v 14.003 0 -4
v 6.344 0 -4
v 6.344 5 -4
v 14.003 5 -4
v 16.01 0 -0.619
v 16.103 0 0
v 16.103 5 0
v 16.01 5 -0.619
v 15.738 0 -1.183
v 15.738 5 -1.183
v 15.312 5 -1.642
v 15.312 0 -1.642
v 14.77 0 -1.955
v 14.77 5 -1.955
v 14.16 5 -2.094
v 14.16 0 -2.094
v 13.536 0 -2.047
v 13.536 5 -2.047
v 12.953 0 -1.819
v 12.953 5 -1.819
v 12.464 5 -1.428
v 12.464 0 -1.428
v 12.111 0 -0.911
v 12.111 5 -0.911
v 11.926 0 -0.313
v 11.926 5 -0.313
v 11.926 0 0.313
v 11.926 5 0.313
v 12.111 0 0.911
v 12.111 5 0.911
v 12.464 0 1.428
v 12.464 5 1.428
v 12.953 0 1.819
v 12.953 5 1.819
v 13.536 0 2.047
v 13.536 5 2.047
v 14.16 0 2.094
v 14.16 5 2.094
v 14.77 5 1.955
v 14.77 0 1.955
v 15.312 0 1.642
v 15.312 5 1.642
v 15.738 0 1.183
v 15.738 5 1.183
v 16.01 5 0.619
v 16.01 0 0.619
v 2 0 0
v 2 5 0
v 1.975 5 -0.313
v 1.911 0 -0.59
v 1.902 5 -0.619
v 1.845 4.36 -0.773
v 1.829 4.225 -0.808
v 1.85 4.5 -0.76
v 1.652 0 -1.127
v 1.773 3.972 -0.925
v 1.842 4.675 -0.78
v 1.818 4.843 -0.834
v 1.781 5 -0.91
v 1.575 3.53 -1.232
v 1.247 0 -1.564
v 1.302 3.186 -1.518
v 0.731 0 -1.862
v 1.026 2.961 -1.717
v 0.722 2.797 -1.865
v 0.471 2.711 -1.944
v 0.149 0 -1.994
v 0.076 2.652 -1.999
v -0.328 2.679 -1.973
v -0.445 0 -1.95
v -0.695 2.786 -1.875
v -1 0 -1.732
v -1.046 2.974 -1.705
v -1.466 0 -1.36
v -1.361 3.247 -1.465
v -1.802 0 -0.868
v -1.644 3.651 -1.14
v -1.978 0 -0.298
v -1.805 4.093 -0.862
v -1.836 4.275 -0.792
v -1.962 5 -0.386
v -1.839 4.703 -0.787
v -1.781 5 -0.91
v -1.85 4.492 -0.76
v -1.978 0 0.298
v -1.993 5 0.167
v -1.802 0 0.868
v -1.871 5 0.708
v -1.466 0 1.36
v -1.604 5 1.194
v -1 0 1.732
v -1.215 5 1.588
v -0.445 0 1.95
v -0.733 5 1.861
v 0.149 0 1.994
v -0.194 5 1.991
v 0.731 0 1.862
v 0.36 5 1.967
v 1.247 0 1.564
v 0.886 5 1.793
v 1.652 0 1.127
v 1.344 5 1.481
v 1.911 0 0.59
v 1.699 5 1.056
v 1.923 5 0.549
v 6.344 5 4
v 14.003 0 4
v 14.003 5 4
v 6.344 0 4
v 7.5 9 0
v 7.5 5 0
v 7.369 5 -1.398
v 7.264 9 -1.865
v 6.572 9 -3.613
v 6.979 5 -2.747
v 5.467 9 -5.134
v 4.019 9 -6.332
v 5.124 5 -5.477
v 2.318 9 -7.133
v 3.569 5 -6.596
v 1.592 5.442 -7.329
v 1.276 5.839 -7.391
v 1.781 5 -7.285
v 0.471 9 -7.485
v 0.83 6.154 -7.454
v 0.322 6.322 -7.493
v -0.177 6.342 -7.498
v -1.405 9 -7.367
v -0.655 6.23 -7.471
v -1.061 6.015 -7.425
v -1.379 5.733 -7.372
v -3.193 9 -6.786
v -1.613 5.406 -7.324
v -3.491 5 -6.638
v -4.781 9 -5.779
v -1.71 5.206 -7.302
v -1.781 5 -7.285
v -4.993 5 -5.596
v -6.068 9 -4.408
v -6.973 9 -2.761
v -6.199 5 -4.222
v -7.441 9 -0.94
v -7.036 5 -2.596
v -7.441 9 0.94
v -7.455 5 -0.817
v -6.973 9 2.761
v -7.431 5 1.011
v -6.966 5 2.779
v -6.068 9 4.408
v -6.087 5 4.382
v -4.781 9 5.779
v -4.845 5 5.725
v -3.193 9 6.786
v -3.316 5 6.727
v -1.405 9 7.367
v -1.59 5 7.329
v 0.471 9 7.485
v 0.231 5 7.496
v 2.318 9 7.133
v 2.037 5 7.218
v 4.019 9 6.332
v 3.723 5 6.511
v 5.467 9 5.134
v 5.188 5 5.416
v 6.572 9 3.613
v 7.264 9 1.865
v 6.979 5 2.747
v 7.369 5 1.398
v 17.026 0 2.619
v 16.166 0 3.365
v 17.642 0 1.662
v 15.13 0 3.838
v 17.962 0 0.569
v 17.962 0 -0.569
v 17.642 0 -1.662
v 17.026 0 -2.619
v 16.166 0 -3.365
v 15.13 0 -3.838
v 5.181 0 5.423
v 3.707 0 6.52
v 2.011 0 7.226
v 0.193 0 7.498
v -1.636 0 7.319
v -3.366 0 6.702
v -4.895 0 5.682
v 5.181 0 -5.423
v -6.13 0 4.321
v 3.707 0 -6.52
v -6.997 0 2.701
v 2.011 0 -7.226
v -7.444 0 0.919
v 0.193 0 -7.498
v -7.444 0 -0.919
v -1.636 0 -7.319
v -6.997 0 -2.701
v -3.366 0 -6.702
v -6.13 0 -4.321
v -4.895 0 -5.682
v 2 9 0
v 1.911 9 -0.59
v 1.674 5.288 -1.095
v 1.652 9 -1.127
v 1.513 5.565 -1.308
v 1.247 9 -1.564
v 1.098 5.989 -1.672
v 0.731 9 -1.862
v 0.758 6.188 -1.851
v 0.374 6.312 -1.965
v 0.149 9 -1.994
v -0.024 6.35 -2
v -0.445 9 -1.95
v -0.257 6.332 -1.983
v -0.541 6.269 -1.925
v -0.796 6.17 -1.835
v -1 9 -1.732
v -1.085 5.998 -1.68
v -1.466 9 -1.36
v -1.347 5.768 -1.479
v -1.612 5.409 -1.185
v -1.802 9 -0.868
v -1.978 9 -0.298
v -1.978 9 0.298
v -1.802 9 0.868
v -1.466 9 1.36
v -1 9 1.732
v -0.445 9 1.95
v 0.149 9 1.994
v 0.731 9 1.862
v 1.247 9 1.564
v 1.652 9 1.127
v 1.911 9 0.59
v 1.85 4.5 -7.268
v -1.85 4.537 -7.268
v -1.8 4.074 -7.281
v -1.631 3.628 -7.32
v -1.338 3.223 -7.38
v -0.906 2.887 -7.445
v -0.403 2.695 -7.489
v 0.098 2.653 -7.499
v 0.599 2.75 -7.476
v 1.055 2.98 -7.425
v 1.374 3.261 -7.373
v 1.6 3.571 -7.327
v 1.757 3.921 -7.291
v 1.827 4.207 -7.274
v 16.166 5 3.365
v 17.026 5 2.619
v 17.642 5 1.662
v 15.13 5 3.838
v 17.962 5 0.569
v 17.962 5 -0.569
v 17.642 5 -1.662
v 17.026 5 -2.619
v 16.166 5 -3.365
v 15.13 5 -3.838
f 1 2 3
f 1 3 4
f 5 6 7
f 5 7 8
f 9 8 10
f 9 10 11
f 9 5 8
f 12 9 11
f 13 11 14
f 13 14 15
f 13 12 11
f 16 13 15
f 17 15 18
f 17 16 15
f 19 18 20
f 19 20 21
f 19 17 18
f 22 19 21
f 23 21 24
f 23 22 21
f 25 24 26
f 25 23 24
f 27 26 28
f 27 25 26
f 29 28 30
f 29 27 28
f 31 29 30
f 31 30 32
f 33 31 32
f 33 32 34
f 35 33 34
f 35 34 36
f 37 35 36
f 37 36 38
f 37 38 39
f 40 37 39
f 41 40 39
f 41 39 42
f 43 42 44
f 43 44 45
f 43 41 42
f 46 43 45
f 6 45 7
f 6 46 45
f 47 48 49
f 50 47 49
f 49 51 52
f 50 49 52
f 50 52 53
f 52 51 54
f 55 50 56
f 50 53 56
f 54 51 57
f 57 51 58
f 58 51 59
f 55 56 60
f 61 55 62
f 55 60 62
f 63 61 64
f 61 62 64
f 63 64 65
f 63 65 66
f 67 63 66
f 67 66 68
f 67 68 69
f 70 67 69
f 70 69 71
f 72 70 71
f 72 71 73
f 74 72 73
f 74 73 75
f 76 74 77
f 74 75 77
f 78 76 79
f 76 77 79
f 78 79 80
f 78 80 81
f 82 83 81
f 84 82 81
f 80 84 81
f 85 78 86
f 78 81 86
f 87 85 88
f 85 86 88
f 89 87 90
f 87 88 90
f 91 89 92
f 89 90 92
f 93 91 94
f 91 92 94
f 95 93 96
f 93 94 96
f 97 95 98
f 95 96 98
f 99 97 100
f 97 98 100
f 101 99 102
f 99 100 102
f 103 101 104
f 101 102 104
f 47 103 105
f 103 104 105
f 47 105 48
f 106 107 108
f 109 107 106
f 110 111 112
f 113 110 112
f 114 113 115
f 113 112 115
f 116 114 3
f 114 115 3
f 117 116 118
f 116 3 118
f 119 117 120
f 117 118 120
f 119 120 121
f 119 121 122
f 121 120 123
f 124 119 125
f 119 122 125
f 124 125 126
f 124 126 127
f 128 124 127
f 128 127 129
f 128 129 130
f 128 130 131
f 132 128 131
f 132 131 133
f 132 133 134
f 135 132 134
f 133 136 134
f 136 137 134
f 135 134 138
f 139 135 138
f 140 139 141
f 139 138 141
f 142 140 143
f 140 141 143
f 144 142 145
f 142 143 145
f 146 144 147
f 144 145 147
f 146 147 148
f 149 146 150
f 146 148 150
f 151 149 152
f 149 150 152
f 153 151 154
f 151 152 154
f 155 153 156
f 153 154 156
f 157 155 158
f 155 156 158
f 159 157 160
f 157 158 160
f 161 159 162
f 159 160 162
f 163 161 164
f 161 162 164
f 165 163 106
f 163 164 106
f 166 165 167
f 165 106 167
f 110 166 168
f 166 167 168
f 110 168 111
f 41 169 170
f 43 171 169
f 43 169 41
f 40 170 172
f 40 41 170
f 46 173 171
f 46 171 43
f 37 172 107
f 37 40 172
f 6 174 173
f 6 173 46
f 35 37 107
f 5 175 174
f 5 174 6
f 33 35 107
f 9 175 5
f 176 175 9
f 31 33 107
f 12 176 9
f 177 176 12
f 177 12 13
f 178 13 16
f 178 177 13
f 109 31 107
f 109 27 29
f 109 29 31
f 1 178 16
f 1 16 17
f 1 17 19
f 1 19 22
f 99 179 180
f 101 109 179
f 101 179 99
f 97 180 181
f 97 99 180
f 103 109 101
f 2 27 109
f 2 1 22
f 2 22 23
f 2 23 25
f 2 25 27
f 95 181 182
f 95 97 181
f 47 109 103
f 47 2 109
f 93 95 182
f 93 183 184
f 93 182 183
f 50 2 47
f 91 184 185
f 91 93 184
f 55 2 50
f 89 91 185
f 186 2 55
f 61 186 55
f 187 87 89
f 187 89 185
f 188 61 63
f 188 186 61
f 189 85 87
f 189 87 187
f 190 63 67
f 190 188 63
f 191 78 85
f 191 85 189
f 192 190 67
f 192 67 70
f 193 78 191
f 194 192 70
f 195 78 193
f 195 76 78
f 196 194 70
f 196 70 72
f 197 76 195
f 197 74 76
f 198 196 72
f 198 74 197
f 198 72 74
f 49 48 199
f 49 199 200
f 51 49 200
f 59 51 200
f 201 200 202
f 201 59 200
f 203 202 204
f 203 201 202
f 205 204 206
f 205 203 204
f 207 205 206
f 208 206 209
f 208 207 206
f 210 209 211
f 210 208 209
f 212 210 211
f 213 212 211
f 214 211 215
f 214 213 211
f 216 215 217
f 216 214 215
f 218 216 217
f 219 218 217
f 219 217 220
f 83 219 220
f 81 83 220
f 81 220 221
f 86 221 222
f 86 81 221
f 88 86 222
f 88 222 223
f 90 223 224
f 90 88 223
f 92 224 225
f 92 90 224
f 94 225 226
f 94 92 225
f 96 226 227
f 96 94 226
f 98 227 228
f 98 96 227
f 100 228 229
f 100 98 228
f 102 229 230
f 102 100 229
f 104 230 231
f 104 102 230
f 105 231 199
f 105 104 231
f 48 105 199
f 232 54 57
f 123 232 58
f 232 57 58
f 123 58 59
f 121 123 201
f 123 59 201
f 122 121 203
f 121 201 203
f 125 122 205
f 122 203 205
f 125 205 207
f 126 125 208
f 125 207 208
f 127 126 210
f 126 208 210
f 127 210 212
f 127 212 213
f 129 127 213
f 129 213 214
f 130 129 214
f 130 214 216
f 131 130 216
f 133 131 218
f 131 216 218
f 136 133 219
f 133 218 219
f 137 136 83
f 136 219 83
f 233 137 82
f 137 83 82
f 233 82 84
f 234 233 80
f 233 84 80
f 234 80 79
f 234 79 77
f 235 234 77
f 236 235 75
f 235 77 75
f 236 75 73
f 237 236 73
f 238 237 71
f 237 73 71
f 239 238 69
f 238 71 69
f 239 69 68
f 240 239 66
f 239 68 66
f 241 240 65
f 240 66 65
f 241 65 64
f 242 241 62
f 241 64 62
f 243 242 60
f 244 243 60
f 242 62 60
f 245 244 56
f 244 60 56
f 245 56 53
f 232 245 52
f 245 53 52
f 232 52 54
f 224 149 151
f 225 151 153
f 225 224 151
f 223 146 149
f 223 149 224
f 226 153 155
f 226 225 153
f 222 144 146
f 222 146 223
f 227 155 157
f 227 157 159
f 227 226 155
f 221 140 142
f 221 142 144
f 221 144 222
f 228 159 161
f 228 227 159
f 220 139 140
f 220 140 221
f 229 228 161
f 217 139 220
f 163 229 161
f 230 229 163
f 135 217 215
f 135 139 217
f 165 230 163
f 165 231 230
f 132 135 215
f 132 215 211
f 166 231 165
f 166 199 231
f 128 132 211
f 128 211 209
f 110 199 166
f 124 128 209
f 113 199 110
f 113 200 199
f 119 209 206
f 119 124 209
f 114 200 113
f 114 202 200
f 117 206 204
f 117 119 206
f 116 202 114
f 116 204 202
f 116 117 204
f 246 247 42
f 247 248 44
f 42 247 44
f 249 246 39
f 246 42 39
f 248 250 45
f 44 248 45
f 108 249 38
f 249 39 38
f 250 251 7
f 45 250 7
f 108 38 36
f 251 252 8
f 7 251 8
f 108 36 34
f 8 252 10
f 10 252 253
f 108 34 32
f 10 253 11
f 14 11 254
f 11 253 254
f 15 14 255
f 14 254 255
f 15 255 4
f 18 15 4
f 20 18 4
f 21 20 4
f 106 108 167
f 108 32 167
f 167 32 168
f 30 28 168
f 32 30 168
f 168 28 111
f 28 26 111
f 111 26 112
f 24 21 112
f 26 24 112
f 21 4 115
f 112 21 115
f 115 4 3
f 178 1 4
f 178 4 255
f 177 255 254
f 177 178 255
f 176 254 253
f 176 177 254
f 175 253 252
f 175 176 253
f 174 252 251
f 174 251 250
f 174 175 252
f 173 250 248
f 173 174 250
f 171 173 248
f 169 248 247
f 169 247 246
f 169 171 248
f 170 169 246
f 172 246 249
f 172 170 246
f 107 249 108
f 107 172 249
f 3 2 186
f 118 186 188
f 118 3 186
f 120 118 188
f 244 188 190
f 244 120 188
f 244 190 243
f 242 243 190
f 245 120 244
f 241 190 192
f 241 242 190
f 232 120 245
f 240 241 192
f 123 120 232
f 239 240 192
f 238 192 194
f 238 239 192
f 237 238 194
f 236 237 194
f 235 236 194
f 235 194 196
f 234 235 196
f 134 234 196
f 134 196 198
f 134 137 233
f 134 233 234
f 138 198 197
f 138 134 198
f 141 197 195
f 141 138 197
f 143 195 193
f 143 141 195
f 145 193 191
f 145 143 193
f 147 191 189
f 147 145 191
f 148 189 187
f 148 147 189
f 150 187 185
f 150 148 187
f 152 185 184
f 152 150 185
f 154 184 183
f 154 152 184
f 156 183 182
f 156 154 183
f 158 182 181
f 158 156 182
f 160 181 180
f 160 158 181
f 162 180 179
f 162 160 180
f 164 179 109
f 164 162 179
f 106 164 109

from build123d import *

# Parameters (mm, degrees)
SKETCH_1_R           = 2.1
EXTRUDE_1_DEPTH      = 5
SKETCH_2_R           = 7.5
SKETCH_2_R_2         = 2
EXTRUDE_2_DEPTH      = 4
EXTRUDE_2_DEPTH_BACK = 5
SKETCH_3_R           = 1.85
CUT_EXTRUDE_1_DEPTH  = 12


with BuildPart() as part:
    # 草图1 → 凸台-拉伸1 (new body)
    with BuildSketch(Plane(origin=(0, 0, 0), x_dir=(1, 0, 0), z_dir=(0, 1, 0))):
        with BuildLine():
            Line((0, 4), (14.003, 4))
            ThreePointArc((14.003, 4), (18.003, 0), (14.003, -4))
            Line((14.003, -4), (0, -4))
            ThreePointArc((0, -4), (-4, 0), (0, 4))
        make_face()
        Circle(SKETCH_1_R, mode=Mode.SUBTRACT)
        with Locations((14.003, 0)):
            Circle(SKETCH_1_R, mode=Mode.SUBTRACT)
    extrude(amount=EXTRUDE_1_DEPTH)

    # 草图2 → 凸台-拉伸2 (add, two sides)
    with BuildSketch(Plane(origin=(0, 5, 0), x_dir=(1, 0, 0), z_dir=(0, 1, 0))) as extrude_2_sk:
        Circle(SKETCH_2_R)
        Circle(SKETCH_2_R_2, mode=Mode.SUBTRACT)
    extrude(amount=EXTRUDE_2_DEPTH)
    extrude(extrude_2_sk.sketch, amount=-EXTRUDE_2_DEPTH_BACK)

    # 草图3 → 切除-拉伸1 (cut)
    with BuildSketch(Plane.XY):
        with Locations((0, 4.5)):
            Circle(SKETCH_3_R)
    extrude(amount=-CUT_EXTRUDE_1_DEPTH, mode=Mode.SUBTRACT)


solid = part.part
